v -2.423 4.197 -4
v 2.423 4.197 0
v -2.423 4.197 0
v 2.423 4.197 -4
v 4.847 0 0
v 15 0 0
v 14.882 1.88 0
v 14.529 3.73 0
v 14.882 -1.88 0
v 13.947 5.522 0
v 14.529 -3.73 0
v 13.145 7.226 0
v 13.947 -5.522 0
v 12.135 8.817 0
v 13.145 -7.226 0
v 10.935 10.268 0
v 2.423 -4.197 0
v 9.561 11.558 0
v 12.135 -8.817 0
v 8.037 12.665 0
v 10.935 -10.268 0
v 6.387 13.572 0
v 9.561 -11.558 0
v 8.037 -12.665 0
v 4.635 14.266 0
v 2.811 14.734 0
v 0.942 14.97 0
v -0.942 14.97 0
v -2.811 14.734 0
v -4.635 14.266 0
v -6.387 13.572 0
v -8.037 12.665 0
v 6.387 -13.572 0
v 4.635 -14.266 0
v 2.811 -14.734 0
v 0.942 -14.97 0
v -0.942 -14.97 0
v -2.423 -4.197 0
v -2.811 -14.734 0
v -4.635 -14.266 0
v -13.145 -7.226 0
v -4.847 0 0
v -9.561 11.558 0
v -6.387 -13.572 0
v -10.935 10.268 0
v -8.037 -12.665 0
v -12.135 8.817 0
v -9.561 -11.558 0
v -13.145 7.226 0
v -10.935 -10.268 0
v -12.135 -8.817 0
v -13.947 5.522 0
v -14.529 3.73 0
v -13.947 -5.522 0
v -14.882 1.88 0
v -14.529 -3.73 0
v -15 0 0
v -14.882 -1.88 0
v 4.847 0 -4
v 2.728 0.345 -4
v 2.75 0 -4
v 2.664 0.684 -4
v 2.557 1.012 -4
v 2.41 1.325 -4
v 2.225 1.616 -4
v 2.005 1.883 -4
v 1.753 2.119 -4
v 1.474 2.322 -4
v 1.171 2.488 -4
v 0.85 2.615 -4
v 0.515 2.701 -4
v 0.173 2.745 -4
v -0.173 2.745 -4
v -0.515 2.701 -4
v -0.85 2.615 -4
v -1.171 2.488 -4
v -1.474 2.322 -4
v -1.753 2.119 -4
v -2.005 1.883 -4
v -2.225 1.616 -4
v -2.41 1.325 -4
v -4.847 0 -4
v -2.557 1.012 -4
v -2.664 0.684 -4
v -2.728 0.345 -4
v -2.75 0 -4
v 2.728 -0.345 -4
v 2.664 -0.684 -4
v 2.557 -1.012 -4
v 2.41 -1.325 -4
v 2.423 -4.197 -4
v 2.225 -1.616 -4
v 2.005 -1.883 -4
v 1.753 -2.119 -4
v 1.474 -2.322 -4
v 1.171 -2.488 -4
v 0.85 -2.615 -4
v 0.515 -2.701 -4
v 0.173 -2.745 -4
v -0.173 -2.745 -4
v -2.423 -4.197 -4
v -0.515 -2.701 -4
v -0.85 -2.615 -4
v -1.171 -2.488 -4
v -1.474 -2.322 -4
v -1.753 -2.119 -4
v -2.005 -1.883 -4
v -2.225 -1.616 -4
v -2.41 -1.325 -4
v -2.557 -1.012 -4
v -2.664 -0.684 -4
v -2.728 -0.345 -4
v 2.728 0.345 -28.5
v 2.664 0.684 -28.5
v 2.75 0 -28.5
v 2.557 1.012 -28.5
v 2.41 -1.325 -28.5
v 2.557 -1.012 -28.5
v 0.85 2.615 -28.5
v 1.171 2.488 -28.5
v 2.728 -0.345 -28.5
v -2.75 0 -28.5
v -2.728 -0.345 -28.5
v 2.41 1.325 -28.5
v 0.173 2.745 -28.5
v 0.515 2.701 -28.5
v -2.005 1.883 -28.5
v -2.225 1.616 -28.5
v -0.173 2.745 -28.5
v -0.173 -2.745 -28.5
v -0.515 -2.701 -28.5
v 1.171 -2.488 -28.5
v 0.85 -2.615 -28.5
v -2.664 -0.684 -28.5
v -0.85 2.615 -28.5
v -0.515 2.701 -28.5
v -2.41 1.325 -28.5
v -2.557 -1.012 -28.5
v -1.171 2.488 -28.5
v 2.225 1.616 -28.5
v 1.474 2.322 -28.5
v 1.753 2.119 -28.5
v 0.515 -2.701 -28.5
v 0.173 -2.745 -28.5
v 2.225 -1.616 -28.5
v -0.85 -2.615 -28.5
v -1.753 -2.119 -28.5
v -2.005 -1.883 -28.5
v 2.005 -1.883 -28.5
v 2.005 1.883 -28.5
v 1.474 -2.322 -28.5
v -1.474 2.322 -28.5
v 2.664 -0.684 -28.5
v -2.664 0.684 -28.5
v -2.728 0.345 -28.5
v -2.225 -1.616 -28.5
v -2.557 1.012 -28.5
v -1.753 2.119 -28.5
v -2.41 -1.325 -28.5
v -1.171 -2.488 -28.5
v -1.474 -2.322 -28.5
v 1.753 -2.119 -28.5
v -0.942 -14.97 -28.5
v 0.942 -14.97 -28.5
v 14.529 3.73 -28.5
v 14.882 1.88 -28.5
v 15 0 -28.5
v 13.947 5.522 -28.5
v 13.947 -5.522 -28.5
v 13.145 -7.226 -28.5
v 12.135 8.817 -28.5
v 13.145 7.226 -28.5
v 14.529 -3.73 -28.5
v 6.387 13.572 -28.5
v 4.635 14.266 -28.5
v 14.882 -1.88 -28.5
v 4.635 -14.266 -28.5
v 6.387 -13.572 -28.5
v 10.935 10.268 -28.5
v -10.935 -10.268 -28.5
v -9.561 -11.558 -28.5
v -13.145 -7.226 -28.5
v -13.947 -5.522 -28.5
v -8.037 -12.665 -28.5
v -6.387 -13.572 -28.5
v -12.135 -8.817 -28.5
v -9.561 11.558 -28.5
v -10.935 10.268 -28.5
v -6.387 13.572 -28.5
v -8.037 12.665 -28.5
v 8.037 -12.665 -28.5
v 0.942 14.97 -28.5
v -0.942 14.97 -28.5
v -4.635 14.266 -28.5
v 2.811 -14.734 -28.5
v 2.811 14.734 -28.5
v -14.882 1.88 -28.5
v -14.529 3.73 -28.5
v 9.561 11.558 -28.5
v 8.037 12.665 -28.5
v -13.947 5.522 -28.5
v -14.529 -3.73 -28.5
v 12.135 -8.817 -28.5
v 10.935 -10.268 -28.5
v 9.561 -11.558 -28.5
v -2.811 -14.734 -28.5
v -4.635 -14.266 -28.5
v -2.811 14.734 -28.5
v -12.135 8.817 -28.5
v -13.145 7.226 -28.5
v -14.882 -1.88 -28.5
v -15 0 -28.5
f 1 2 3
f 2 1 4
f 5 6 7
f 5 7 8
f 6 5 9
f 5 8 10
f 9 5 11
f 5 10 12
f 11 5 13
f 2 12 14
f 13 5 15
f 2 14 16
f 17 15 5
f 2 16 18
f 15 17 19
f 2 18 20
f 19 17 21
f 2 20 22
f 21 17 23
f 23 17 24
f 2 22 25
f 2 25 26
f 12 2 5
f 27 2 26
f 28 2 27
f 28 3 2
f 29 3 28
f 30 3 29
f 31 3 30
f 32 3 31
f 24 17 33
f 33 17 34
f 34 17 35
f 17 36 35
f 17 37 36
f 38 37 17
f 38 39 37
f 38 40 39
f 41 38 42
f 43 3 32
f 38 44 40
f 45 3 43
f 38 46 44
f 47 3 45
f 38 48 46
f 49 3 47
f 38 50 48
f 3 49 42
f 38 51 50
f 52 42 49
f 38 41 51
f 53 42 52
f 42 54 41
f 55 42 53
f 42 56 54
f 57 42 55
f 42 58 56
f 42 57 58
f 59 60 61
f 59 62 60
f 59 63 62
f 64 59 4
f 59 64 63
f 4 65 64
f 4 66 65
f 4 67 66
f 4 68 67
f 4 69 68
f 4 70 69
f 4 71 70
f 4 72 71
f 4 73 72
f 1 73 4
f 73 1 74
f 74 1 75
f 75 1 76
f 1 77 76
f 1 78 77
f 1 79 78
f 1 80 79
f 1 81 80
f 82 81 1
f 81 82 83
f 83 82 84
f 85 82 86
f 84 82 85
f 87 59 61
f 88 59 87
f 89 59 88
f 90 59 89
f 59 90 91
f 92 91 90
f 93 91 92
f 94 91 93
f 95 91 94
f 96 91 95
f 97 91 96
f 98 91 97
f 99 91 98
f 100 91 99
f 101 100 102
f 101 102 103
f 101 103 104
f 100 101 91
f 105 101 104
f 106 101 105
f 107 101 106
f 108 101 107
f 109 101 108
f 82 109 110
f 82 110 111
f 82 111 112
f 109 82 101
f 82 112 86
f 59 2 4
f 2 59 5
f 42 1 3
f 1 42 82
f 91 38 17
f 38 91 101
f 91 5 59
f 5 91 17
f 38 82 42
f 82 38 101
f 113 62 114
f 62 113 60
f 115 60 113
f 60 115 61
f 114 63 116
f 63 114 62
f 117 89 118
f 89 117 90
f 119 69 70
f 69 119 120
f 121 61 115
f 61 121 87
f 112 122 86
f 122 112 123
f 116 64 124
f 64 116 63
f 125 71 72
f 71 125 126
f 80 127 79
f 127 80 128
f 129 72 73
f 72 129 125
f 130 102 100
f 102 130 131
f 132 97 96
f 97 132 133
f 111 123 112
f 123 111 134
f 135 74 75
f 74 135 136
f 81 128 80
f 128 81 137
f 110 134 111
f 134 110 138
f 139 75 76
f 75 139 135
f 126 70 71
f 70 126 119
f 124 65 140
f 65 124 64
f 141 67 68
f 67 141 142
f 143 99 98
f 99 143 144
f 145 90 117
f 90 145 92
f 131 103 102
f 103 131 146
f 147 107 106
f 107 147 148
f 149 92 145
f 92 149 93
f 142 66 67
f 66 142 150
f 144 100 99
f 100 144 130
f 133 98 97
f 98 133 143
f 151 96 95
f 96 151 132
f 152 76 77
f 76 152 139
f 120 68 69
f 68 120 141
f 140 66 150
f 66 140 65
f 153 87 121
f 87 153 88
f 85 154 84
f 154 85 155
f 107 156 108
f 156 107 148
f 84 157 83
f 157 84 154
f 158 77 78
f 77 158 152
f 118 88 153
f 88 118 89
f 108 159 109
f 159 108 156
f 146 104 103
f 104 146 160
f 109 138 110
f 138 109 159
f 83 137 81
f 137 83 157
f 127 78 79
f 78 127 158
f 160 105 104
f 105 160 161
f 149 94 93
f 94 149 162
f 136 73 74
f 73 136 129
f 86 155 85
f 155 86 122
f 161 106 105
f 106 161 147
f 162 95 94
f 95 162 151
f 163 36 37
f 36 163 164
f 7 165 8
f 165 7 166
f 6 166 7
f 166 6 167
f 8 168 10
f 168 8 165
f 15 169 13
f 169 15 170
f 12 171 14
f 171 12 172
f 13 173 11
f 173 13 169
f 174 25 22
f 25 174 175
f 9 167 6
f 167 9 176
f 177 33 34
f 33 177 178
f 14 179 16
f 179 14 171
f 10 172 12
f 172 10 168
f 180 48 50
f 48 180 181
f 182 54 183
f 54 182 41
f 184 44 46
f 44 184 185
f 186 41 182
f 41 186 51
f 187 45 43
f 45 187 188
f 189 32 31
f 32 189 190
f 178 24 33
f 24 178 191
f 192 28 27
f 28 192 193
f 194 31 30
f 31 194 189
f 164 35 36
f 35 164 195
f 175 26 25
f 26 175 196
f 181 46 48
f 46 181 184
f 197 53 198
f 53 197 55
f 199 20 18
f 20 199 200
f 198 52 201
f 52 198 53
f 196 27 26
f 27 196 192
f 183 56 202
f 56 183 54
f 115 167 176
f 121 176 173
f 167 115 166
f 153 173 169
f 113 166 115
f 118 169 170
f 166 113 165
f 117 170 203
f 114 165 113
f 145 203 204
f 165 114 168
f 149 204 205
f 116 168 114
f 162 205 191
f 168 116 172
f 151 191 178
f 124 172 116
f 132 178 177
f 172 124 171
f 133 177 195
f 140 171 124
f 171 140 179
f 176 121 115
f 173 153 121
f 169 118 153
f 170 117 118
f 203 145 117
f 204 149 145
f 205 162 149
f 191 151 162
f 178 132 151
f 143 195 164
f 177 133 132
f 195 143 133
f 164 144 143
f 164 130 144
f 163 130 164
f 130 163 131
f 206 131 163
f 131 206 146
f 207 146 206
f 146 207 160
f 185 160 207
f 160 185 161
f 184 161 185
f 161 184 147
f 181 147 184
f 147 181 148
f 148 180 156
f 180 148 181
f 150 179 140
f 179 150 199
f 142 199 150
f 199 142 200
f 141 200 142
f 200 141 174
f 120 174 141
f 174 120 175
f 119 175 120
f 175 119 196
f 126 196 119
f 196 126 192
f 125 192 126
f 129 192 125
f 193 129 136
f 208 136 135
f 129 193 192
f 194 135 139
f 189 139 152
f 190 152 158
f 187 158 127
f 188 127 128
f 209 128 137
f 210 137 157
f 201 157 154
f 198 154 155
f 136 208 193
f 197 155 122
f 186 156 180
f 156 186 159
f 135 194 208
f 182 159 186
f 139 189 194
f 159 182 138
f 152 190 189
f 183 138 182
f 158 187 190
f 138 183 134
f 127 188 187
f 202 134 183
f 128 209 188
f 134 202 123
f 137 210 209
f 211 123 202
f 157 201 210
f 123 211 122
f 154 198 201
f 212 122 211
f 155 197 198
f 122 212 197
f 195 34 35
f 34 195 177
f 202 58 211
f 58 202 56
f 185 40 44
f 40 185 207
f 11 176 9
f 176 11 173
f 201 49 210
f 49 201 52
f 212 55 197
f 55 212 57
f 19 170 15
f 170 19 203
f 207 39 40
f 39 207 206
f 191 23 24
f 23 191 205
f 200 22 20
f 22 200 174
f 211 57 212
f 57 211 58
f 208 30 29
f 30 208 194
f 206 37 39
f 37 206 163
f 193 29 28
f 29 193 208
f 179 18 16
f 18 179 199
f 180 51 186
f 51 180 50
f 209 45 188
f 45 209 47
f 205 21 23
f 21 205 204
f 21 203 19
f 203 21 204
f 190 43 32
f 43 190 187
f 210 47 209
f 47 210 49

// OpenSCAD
$fn = 50;


difference() {
	union() {
		translate(v = [0, 0, -28.5000000000]) {
			cylinder(h = 28.5000000000, r = 15.0000000000);
		}
	}
	union() {
		translate(v = [0, 0, 0]) {
			rotate(a = [0, 0, 0]) {
				difference() {
					union() {
						translate(v = [0, 0, -4]) {
							linear_extrude(height = 4) {
								polygon(points = [[4.8468000000, 0.0000000000], [2.4234000000, 4.1974519271], [-2.4234000000, 4.1974519271], [-4.8468000000, 0.0000000000], [-2.4234000000, -4.1974519271], [2.4234000000, -4.1974519271]]);
							}
						}
					}
					union();
				}
			}
		}
		#translate(v = [0, 0, -100.0000000000]) {
			cylinder(h = 200, r = 2.7500000000);
		}
	}
}
